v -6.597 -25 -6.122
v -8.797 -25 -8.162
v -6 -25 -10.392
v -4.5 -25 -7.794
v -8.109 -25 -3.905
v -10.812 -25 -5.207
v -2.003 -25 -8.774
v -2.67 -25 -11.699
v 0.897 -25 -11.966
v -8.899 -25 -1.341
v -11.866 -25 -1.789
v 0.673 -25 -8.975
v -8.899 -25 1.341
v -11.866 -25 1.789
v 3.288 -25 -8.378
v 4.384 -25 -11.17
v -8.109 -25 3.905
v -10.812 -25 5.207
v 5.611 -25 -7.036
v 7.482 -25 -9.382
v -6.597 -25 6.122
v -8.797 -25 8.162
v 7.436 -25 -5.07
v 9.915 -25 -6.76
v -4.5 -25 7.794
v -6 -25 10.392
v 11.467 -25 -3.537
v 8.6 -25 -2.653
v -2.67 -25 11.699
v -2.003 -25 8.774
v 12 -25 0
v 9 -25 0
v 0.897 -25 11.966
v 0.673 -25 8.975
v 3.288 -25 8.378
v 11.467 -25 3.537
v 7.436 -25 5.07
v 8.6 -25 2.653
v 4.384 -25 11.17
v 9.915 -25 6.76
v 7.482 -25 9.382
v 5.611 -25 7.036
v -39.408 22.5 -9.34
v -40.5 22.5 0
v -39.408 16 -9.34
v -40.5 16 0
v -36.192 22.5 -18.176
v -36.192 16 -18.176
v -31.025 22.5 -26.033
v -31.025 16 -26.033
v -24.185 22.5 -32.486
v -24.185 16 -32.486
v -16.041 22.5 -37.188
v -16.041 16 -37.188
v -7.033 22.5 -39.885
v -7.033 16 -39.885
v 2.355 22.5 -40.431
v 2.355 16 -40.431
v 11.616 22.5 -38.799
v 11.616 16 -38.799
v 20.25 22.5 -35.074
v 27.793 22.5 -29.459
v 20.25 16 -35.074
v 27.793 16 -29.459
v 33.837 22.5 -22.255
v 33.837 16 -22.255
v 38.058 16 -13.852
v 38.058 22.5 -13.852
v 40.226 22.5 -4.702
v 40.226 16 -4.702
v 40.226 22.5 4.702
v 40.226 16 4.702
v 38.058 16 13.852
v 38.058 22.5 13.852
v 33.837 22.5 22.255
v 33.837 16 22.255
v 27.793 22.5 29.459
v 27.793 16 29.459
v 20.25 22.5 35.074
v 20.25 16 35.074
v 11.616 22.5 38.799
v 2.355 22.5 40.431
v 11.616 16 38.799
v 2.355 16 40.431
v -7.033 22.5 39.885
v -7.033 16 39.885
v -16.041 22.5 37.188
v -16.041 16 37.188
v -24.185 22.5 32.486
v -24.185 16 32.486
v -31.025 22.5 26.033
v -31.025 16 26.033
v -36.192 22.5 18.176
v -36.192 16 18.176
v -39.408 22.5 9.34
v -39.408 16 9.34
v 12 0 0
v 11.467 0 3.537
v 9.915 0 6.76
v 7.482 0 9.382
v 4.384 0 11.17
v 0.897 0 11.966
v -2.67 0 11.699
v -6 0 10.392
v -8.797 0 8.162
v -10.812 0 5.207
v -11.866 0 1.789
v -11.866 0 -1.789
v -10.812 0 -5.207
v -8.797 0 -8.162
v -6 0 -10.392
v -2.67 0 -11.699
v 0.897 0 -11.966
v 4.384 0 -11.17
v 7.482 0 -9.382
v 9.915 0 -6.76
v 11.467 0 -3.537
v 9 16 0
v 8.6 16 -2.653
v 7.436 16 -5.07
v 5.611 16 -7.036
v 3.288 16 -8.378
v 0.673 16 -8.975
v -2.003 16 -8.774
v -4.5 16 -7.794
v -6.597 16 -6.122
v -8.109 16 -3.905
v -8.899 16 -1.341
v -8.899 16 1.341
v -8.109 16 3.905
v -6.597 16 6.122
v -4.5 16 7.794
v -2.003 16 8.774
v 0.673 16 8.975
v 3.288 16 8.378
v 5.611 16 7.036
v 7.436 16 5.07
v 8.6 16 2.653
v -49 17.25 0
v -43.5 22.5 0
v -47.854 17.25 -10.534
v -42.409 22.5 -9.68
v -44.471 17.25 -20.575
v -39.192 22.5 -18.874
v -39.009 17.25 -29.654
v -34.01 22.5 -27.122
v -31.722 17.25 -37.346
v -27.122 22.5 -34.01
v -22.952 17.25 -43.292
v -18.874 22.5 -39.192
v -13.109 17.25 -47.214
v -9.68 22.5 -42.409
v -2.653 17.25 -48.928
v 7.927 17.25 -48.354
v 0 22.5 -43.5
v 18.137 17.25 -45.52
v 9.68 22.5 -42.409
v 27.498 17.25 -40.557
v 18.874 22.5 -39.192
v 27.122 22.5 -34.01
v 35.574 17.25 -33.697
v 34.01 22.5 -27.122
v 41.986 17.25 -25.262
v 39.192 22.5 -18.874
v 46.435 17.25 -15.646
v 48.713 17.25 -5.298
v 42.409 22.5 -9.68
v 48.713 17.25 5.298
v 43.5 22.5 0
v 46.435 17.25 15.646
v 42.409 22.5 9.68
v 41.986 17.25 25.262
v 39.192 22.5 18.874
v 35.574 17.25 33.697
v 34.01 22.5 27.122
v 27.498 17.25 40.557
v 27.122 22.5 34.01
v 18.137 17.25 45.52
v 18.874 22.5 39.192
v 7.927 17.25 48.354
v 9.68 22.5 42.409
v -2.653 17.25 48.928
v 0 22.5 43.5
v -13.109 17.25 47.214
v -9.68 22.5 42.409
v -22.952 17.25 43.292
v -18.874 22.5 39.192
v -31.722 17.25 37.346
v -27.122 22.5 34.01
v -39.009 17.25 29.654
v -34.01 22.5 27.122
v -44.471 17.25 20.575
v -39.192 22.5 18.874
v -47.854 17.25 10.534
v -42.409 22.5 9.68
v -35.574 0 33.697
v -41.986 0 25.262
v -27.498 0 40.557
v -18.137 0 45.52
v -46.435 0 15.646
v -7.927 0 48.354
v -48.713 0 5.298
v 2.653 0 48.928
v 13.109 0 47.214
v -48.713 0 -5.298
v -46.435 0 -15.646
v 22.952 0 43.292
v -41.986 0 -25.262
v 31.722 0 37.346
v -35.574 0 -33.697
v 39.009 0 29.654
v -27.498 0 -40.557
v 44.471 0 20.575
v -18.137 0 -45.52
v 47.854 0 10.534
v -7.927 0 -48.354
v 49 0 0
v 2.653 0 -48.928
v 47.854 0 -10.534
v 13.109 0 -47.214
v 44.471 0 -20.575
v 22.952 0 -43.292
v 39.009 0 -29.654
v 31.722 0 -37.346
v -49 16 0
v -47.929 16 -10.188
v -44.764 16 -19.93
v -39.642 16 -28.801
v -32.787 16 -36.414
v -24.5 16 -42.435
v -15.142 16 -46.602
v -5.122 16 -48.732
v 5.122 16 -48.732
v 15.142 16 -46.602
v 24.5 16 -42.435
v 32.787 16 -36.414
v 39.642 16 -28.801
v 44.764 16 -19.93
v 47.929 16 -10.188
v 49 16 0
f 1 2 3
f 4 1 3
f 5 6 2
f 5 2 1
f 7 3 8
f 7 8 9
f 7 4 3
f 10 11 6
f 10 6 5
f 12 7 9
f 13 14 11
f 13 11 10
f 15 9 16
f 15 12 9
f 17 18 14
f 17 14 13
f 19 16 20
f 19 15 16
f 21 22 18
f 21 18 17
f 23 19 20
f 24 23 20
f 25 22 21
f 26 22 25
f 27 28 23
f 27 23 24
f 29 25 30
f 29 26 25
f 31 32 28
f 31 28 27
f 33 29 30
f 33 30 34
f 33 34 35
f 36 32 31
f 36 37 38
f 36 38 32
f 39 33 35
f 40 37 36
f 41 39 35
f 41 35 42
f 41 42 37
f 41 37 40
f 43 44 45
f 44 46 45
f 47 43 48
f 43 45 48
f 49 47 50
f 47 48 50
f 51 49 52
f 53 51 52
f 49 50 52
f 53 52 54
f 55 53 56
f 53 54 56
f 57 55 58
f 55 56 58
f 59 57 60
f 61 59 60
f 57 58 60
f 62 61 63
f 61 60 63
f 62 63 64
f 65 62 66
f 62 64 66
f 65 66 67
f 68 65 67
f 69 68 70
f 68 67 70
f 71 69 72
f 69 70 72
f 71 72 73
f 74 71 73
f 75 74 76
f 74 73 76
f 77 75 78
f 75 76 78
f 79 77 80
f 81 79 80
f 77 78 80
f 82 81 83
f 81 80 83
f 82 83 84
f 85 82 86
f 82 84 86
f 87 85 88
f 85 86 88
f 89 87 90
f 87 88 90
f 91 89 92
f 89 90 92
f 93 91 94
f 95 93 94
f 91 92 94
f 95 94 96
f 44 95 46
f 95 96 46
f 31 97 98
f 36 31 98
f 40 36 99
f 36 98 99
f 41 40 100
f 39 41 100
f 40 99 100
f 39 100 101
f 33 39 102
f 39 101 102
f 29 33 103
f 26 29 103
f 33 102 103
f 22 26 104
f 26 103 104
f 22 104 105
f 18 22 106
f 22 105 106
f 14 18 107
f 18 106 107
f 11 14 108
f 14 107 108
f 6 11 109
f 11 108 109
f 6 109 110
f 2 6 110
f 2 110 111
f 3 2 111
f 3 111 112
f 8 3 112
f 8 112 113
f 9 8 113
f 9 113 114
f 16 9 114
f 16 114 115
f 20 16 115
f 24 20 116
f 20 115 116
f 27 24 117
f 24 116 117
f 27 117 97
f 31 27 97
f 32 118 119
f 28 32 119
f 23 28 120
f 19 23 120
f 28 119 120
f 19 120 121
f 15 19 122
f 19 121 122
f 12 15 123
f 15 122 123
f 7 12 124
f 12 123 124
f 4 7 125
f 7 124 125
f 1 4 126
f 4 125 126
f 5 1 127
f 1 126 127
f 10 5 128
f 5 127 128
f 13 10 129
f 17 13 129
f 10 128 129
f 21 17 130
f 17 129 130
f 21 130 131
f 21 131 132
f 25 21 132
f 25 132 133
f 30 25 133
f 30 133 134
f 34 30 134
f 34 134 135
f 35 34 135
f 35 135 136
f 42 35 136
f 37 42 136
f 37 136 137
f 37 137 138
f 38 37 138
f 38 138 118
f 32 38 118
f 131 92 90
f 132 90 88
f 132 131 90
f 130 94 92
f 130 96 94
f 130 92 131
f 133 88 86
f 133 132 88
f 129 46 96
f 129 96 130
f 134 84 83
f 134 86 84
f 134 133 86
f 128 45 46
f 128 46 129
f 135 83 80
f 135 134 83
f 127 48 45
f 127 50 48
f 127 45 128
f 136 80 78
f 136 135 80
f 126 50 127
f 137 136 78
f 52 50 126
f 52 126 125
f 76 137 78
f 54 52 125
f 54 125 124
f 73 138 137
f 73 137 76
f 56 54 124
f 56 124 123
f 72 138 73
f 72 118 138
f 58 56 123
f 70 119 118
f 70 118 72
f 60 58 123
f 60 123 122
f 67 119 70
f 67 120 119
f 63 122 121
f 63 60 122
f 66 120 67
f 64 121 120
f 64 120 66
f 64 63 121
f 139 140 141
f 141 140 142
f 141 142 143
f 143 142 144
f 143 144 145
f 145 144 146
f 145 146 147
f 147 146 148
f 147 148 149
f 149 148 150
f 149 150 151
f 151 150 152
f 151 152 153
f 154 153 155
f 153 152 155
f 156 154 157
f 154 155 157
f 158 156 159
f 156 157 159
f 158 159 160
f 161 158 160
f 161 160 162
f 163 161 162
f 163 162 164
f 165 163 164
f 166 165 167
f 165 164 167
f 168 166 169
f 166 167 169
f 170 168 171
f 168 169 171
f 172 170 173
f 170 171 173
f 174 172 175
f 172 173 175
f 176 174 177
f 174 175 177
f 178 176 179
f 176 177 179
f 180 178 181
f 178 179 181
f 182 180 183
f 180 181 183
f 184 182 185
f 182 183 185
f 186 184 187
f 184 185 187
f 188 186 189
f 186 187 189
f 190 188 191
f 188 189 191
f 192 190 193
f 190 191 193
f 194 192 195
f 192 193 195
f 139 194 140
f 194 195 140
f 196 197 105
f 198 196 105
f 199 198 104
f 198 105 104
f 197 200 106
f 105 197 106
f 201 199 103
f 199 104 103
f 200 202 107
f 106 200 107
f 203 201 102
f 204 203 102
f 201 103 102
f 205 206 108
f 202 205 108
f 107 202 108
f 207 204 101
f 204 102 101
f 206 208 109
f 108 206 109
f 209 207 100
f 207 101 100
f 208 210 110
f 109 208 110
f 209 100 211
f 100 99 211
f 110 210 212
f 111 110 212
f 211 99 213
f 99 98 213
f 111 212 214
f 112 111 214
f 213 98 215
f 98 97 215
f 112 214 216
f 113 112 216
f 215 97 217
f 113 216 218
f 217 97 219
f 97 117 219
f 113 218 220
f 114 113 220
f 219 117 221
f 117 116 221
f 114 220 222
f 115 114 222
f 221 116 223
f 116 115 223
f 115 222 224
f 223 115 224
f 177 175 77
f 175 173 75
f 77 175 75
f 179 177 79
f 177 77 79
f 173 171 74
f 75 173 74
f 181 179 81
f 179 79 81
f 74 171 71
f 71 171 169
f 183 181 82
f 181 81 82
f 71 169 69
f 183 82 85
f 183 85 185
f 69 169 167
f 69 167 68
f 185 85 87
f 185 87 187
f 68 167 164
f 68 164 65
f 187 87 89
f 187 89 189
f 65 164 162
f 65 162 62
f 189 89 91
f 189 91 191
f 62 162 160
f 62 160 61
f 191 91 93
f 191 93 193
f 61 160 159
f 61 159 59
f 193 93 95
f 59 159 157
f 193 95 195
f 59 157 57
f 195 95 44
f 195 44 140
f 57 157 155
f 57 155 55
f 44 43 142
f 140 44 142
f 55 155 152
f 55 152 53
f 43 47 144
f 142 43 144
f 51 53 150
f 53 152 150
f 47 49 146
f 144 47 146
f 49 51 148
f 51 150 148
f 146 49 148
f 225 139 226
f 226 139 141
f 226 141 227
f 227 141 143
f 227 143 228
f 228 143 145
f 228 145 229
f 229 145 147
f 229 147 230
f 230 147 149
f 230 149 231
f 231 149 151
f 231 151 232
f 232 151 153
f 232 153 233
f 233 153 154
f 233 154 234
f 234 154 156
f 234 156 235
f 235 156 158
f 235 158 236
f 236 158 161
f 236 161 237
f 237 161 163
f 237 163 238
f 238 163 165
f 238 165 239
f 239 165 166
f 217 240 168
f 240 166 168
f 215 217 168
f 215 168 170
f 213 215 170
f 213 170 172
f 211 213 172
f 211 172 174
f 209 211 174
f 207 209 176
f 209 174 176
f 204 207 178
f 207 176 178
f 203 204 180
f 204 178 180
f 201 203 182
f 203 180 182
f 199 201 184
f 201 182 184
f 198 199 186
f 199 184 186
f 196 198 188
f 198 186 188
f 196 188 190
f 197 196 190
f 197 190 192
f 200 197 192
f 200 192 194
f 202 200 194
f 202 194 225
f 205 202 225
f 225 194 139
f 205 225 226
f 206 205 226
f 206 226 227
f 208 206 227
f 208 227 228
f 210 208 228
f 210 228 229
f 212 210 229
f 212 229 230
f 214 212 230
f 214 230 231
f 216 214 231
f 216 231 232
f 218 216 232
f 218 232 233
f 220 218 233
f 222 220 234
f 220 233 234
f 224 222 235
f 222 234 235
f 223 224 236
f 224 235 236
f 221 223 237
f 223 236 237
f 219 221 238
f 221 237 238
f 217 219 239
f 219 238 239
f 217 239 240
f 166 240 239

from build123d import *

# Parameters (mm, degrees)
SKETCH1_R           = 49
BOSS_EXTRUDE1_DEPTH = 16
SKETCH3_R           = 12
BOSS_EXTRUDE2_DEPTH = 25
SKETCH4_R           = 9
CUT_EXTRUDE1_DEPTH  = 42


with BuildPart() as part:
    # Sketch1 → Boss-Extrude1 (new body)
    with BuildSketch(Plane(origin=(0, 0, 0), x_dir=(1, 0, 0), z_dir=(0, 1, 0))):
        Circle(SKETCH1_R)
    extrude(amount=BOSS_EXTRUDE1_DEPTH)

    # Sketch2 → Revolve1 (revolve)
    with BuildSketch(Plane.XY):
        Polygon((-43.5, 22.5), (-40.5, 22.5), (-40.5, 16), (-49, 16), (-49, 17.25), align=None)
    revolve(axis=Axis((0, 16, 0), (0, -1, 0)))

    # Sketch3 → Boss-Extrude2 (add)
    with BuildSketch(Plane.XZ):
        Circle(SKETCH3_R)
    extrude(amount=BOSS_EXTRUDE2_DEPTH)

    # Sketch4 → Cut-Extrude1 (cut, through all)
    with BuildSketch(Plane(origin=(0, 16, 0), x_dir=(1, 0, 0), z_dir=(0, 1, 0))):
        Circle(SKETCH4_R)
    extrude(amount=-CUT_EXTRUDE1_DEPTH, mode=Mode.SUBTRACT)


solid = part.part
